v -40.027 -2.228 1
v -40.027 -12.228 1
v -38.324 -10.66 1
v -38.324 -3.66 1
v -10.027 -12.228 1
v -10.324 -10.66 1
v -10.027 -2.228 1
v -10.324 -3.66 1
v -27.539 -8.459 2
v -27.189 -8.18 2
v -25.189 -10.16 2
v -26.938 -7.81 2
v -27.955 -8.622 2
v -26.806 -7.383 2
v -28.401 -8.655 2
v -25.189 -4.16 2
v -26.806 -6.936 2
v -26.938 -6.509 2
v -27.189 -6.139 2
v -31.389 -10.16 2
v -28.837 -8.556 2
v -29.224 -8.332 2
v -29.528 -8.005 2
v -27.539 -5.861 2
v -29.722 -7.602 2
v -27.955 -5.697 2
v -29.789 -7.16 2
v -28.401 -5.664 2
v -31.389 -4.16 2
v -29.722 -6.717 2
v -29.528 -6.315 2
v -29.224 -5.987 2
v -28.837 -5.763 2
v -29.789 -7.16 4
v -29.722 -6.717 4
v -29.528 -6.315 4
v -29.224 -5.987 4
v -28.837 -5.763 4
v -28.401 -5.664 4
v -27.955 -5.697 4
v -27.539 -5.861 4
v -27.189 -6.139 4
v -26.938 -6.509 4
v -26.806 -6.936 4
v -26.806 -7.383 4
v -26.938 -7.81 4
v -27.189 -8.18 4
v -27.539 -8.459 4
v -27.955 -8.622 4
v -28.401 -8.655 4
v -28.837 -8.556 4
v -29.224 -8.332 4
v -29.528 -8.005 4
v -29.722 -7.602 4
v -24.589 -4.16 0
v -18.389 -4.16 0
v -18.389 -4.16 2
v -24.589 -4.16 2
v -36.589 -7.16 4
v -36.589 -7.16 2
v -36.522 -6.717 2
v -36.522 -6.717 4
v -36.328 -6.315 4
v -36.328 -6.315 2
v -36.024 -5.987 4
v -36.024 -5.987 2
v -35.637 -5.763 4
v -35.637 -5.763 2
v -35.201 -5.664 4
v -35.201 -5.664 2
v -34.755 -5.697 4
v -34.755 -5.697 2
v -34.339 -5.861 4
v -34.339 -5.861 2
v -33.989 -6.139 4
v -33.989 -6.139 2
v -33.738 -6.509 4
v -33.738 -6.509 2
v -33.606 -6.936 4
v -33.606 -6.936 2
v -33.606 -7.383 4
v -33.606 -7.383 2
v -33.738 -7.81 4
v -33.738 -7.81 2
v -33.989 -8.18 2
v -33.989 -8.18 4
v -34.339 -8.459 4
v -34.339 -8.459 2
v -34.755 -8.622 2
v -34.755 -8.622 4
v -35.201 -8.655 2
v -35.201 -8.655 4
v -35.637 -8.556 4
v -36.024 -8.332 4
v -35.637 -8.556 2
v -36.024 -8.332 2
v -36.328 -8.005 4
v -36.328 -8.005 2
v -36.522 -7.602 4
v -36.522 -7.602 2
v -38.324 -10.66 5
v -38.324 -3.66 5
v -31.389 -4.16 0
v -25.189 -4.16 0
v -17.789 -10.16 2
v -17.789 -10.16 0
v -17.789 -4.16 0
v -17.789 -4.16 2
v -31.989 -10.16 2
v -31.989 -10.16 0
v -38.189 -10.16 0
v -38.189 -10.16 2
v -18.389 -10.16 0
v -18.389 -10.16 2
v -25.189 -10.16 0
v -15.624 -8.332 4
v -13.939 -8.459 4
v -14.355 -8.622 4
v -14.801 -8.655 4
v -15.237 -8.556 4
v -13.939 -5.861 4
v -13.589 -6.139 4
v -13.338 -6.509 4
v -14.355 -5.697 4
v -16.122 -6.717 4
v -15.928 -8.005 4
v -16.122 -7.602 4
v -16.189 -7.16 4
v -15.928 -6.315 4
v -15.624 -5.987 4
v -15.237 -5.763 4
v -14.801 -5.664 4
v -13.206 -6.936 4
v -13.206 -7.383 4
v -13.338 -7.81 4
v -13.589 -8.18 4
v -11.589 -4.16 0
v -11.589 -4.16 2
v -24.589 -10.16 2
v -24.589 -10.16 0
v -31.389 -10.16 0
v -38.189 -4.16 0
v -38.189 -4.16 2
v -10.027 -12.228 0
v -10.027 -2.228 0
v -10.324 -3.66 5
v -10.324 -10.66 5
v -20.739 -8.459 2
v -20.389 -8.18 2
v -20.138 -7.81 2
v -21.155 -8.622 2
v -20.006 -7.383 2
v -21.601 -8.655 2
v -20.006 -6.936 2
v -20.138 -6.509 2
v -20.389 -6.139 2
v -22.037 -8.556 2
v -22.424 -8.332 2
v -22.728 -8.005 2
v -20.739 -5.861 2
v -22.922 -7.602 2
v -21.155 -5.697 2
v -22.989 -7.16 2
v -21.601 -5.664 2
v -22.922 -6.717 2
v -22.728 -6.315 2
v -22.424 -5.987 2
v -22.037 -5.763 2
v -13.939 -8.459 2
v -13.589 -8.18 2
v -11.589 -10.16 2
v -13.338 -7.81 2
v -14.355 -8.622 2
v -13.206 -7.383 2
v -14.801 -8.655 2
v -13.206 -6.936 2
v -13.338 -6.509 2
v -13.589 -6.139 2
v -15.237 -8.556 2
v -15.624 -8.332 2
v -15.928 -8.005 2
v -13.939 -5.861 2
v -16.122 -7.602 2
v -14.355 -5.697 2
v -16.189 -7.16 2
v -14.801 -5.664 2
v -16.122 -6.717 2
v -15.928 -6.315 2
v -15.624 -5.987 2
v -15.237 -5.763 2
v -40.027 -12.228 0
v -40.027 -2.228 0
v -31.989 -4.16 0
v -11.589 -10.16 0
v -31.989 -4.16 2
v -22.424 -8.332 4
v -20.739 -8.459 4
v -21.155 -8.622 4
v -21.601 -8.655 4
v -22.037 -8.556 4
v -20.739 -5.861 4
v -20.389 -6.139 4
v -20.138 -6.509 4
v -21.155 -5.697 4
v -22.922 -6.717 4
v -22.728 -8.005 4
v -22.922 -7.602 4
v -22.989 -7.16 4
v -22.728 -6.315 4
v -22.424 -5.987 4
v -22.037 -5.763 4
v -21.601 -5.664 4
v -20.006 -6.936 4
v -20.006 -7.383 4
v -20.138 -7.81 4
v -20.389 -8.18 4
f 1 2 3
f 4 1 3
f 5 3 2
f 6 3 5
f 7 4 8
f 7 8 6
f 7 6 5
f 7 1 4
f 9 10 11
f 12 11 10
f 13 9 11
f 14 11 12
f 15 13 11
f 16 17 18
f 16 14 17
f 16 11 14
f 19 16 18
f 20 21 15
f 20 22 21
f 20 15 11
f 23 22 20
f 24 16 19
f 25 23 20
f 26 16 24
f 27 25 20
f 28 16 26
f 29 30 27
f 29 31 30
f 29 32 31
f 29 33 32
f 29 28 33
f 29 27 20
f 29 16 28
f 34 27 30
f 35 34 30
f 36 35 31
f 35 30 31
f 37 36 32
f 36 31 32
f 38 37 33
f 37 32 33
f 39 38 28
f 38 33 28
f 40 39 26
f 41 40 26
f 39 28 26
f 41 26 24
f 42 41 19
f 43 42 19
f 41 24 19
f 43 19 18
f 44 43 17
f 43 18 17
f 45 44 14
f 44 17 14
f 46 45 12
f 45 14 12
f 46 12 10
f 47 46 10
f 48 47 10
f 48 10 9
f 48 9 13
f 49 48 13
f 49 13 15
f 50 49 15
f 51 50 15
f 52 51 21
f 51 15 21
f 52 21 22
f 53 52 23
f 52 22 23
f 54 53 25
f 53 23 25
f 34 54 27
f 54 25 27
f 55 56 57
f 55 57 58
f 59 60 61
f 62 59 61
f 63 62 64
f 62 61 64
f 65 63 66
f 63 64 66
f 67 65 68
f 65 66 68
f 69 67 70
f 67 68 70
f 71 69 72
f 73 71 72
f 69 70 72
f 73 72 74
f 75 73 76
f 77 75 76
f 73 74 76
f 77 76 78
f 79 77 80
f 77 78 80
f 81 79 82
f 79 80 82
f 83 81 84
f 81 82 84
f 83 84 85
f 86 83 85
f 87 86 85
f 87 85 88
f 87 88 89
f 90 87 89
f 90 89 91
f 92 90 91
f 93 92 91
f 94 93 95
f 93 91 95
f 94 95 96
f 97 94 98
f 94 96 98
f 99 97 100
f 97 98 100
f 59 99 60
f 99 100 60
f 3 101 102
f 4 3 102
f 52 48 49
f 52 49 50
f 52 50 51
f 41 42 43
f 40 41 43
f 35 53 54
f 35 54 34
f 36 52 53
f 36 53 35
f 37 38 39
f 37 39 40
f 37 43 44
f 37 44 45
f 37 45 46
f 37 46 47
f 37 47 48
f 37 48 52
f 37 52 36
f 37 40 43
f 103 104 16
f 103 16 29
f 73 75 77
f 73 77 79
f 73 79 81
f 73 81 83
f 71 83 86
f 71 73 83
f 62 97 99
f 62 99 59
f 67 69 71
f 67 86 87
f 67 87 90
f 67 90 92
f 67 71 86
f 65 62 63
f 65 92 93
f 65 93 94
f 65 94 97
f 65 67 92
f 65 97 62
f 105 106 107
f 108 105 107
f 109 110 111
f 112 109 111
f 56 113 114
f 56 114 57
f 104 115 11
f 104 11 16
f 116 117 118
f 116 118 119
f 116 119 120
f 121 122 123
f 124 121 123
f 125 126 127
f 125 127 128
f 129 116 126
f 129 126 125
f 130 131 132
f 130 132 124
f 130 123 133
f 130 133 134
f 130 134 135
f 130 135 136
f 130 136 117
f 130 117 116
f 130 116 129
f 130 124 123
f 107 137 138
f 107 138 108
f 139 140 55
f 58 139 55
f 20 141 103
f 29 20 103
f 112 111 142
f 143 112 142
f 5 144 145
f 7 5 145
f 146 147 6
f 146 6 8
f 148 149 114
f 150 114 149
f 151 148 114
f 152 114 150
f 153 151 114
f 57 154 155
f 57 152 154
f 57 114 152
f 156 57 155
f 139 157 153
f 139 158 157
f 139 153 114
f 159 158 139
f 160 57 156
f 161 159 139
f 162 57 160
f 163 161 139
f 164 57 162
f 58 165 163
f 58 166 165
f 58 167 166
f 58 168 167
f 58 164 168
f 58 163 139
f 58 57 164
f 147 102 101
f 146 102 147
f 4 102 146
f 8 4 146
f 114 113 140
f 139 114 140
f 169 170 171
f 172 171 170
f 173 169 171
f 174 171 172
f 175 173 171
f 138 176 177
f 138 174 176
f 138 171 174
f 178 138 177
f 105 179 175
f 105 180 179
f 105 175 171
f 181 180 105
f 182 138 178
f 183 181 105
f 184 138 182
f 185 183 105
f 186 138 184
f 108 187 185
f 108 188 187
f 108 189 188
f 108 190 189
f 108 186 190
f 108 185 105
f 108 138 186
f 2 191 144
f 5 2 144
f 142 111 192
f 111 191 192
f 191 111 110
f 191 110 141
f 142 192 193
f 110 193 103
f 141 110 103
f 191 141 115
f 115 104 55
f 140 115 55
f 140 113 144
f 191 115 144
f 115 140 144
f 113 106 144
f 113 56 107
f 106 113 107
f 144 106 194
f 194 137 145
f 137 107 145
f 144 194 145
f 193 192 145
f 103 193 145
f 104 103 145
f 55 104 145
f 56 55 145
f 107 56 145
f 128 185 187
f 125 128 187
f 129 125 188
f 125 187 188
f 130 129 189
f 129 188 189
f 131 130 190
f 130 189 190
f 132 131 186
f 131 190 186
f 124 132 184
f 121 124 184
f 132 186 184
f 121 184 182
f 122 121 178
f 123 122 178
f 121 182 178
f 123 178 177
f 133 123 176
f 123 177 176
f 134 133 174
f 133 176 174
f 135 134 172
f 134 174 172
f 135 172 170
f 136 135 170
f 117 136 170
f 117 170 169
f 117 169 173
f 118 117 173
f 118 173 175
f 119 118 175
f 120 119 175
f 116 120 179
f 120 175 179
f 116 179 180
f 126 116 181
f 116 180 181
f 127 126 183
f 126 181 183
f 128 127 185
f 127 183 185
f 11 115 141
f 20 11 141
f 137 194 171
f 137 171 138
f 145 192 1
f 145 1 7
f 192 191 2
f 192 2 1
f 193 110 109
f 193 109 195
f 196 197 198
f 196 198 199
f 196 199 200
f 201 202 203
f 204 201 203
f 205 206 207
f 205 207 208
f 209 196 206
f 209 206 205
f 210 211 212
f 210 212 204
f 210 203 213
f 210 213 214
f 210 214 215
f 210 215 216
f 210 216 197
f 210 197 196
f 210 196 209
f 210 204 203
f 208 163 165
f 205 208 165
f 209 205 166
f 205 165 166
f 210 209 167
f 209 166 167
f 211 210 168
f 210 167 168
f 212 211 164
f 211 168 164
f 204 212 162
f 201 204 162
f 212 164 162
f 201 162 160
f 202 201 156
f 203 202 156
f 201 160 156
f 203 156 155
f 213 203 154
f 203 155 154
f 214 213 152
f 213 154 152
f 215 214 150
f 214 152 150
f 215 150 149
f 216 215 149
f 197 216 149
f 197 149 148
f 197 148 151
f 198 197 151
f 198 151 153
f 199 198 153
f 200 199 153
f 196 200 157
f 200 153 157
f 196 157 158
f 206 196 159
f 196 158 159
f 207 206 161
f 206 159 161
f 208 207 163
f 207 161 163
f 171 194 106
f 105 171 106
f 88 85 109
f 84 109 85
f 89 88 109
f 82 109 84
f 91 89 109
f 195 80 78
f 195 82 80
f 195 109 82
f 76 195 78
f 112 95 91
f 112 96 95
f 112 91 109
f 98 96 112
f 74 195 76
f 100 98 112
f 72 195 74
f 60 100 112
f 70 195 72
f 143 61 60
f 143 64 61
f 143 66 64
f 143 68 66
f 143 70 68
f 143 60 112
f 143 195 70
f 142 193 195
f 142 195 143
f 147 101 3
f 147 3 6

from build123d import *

# Parameters (mm, degrees)
SKETCH_1_W          = 30
SKETCH_1_H          = 10
EXTRUDE_1_DEPTH     = 5
SKETCH_2_W          = 6.2
SKETCH_2_H          = 6
CUT_EXTRUDE_1_DEPTH = 2
SKETCH_3_R          = 1.5
CUT_EXTRUDE_4_DEPTH = 2
SKETCH_5_W          = 30
SKETCH_5_H          = 10
SKETCH_5_W_2        = 28
SKETCH_5_H_2        = 7
CUT_EXTRUDE_5_DEPTH = 4


with BuildPart() as part:
    # 草图1 → 凸台-拉伸1 (new body)
    with BuildSketch(Plane.XY):
        with Locations((-25.027311994, -7.227757648)):
            Rectangle(SKETCH_1_W, SKETCH_1_H)
    extrude(amount=EXTRUDE_1_DEPTH)

    # 草图2 → 切除-拉伸1 (cut)
    with BuildSketch(Plane(origin=(0, 0, 0), x_dir=(-1, 0, 0), z_dir=(0, 0, -1))):
        with Locations((21.488967254, -7.159562762)):
            Rectangle(SKETCH_2_W, SKETCH_2_H)
        with Locations((14.688967254, -7.159562762)):
            Rectangle(SKETCH_2_W, SKETCH_2_H)
        with Locations((28.288967254, -7.159562762)):
            Rectangle(SKETCH_2_W, SKETCH_2_H)
        with Locations((35.088967254, -7.159562762)):
            Rectangle(SKETCH_2_W, SKETCH_2_H)
    extrude(amount=-CUT_EXTRUDE_1_DEPTH, mode=Mode.SUBTRACT)

    # 草图3 → 切除-拉伸4 (cut)
    with BuildSketch(Plane(origin=(0, 0, 2), x_dir=(-1, 0, 0), z_dir=(0, 0, -1))):
        with Locations((14.688967254, -7.159562762)):
            Circle(SKETCH_3_R)
        with Locations((21.488967254, -7.159562762)):
            Circle(SKETCH_3_R)
        with Locations((28.288967254, -7.159562762)):
            Circle(SKETCH_3_R)
        with Locations((35.088967254, -7.159562762)):
            Circle(SKETCH_3_R)
    extrude(amount=-CUT_EXTRUDE_4_DEPTH, mode=Mode.SUBTRACT)

    # 草图5 → 切除-拉伸5 (cut)
    with BuildSketch(Plane.XY.offset(5)):
        with Locations((-25.027311994, -7.227757648)):
            Rectangle(SKETCH_5_W, SKETCH_5_H)
        with Locations((-24.3244943, -7.159562762)):
            Rectangle(SKETCH_5_W_2, SKETCH_5_H_2, mode=Mode.SUBTRACT)
    extrude(amount=-CUT_EXTRUDE_5_DEPTH, mode=Mode.SUBTRACT)


solid = part.part
